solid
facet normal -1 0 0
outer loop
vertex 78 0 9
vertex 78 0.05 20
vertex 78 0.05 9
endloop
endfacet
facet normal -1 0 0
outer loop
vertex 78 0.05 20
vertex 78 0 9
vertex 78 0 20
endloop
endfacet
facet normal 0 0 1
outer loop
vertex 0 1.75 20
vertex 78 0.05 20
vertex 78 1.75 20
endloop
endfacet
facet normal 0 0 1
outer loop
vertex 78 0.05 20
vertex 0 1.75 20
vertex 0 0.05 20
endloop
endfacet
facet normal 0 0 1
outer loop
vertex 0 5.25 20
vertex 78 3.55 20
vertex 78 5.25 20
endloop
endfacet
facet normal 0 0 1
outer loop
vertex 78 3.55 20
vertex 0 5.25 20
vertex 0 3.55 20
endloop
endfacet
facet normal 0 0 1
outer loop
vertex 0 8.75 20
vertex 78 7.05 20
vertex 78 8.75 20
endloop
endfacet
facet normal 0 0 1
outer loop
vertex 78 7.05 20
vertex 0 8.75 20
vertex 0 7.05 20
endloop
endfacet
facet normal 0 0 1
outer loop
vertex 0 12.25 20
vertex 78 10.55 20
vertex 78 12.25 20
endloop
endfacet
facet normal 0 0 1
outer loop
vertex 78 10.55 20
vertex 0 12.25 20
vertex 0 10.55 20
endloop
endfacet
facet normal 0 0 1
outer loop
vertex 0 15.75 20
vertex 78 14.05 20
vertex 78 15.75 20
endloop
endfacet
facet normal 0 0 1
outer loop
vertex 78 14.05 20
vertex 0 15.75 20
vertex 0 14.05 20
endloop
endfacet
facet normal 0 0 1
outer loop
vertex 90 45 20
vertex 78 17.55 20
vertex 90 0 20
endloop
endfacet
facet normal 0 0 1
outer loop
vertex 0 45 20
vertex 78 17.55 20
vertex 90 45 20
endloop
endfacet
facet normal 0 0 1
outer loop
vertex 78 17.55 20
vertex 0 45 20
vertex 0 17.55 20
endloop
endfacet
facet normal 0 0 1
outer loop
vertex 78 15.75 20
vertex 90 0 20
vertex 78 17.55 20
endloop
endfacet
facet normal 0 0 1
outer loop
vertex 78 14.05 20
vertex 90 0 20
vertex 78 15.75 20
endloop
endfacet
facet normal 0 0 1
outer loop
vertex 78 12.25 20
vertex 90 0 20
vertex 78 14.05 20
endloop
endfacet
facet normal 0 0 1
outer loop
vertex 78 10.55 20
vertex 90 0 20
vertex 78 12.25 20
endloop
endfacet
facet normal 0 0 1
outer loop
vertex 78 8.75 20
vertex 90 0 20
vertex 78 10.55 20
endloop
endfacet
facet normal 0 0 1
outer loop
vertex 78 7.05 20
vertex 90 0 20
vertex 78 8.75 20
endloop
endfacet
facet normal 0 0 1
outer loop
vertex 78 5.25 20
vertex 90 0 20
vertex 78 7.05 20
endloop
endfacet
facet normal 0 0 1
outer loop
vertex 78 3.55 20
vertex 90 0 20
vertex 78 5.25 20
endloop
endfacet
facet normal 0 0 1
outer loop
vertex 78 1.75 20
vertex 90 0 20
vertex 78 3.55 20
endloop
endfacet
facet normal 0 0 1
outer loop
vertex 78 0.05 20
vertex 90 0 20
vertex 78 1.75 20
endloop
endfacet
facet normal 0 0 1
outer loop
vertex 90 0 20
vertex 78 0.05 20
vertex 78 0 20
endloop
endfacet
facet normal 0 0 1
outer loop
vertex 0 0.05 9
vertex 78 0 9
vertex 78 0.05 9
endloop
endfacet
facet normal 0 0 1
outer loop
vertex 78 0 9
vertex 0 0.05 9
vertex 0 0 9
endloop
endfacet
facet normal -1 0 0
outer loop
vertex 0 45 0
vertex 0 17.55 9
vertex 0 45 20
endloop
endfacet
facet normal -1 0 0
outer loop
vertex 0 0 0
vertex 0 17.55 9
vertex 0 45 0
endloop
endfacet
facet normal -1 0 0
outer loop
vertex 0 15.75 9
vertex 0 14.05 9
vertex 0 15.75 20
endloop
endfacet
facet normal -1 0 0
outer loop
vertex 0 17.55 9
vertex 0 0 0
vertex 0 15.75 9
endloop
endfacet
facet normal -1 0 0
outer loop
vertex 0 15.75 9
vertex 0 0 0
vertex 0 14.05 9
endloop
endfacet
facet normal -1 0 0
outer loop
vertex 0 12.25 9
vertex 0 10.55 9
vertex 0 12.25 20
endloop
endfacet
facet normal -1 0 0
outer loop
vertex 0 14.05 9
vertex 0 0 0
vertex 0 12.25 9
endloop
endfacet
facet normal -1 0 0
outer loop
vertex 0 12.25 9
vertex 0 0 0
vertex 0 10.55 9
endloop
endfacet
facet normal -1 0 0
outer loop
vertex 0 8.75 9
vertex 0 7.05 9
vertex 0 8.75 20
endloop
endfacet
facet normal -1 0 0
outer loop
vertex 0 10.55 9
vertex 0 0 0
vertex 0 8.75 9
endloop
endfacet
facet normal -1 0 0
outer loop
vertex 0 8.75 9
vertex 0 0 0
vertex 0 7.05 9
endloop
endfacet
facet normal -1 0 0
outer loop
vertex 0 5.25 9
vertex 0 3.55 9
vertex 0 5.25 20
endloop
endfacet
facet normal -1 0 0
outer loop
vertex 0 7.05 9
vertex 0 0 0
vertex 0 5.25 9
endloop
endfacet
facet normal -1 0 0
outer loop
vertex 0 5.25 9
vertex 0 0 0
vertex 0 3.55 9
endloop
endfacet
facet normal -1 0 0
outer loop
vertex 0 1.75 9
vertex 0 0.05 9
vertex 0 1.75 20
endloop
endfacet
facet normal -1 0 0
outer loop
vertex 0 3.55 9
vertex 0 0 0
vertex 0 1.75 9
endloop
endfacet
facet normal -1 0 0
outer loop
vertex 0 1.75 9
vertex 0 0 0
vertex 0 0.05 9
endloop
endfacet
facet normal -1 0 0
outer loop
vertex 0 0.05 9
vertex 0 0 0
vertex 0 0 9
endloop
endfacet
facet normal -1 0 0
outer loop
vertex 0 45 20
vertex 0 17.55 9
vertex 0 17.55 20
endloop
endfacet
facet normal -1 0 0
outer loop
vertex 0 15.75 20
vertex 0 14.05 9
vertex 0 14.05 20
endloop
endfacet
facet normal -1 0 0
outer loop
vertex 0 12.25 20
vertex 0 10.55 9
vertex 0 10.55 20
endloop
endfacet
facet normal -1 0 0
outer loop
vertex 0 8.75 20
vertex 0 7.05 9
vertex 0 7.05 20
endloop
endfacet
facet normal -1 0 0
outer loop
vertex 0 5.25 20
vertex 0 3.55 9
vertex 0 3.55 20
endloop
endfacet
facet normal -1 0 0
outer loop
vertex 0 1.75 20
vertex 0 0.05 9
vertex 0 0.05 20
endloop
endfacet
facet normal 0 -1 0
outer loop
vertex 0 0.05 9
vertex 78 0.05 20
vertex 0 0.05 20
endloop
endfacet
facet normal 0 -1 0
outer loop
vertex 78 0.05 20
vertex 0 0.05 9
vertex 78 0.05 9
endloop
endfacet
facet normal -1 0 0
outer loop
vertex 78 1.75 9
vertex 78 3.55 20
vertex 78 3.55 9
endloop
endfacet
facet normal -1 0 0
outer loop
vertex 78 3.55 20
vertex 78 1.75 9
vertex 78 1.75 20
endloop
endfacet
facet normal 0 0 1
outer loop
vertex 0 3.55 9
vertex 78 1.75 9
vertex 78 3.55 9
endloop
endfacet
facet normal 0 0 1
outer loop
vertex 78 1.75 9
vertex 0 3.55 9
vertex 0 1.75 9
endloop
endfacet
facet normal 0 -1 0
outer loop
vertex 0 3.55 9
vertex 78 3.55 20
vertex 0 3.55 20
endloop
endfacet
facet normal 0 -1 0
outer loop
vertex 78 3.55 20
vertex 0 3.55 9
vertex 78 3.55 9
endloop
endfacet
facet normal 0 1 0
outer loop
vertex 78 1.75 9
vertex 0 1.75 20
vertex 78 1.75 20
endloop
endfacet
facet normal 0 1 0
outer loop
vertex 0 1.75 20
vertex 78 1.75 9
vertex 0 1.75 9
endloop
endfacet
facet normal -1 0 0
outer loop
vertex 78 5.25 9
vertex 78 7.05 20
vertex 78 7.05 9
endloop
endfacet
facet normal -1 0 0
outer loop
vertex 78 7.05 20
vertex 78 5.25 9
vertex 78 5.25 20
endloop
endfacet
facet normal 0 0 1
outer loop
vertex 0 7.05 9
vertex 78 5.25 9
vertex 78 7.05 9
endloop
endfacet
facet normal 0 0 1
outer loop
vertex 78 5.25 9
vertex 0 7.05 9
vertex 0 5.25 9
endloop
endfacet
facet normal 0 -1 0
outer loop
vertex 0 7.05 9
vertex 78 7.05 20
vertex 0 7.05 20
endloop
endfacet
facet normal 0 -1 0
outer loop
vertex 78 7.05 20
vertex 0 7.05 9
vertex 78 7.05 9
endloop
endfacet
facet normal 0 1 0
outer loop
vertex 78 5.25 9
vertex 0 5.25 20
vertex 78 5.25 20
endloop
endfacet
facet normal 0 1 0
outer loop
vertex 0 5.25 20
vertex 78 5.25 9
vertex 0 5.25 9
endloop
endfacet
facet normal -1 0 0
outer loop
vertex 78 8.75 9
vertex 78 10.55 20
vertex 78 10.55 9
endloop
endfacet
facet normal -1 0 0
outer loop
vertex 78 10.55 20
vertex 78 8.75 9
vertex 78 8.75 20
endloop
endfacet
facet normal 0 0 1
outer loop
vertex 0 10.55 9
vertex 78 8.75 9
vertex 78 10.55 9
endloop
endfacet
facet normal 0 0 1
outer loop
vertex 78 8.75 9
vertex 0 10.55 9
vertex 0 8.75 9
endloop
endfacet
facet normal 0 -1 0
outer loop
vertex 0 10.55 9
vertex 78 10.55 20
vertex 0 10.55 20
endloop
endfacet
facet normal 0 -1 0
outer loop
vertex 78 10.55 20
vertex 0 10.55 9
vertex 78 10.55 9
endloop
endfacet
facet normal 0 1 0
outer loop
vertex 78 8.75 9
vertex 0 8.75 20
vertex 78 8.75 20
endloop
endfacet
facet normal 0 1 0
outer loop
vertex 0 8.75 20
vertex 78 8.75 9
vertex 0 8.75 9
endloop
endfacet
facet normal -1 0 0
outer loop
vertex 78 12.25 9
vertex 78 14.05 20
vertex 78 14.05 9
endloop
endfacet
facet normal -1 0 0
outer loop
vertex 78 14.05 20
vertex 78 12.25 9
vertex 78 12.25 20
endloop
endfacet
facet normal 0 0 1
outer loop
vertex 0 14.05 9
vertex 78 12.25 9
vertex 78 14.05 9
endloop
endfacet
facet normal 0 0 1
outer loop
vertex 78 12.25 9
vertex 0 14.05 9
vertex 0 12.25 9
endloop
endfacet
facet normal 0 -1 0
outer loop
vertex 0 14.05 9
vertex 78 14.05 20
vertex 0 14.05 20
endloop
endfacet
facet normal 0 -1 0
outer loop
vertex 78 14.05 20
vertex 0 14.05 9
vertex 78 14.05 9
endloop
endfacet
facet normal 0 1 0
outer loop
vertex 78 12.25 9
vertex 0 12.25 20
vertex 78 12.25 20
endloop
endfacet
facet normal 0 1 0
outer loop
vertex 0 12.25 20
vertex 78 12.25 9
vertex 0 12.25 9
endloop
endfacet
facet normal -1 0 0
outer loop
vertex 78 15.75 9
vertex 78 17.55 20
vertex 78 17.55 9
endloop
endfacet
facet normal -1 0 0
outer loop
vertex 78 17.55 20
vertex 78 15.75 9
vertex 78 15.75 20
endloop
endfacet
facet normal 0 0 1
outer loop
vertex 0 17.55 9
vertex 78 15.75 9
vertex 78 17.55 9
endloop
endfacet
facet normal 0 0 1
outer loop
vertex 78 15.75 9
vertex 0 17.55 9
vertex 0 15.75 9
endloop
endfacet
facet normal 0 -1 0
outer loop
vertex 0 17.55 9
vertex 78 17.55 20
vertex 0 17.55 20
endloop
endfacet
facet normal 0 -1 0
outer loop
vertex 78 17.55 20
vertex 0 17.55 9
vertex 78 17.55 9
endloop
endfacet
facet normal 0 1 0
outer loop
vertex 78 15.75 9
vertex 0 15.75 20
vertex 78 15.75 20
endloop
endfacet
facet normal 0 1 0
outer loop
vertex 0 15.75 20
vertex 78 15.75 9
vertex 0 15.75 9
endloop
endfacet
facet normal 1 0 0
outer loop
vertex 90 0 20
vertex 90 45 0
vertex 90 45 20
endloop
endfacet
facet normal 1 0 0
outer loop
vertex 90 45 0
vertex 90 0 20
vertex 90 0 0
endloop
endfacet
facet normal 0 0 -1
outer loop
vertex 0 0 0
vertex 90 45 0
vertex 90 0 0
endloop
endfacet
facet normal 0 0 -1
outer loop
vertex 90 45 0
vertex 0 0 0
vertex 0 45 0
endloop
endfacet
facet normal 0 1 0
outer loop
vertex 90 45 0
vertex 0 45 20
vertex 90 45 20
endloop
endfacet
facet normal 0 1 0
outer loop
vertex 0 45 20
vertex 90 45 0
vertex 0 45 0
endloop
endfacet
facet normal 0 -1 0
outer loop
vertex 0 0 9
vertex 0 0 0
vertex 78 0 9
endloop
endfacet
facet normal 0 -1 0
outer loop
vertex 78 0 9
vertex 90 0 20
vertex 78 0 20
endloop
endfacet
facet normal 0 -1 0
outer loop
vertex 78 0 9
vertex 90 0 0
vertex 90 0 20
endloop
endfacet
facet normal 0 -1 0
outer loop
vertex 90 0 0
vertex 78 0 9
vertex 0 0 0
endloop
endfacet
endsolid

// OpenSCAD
// Drying Rack for Microscope Slides

// Base Block Dimensions
base_length = 90;    // Length along X (mm)
base_width = 45;     // Width along Y (mm)
base_height = 20;    // Height along Z (mm)

// Slide Slot Dimensions
slot_length = 77;    // Length of the slot along X (mm)
slot_width = 1.6;    // Width of the slot along Y (mm)
slot_depth = 10;     // Depth of the slot into Z (mm)

// Slot Arrangement Parameters
num_slots = 10;      // Number of slots
slot_spacing = 3.5;  // Center-to-center spacing between slots in Y

$fn = 64; // High resolution for curves

// --- Base Block ---
module base() {
    cube([base_length, base_width, base_height]);
}

// --- Slot Cutting Tool (Extruded shape) ---
// The slot is cut into the top face (Z=20). It needs to extend slightly past the faces.
module slot_cutter(x_offset, y_offset) {
    // The cutter must be long enough in X and deep enough in Z.
    // We make it slightly longer than the required 77mm cut length for safety/coplanarity rule.
    cut_length = slot_length + 1; // Extend past X faces
    cut_width = slot_width + 0.2; // Extend slightly past Y faces (though slots are defined by their width)
    cut_depth = slot_depth + 1;  // Extend past Z face it cuts into

    translate([x_offset, y_offset, base_height - cut_depth]) {
        cube([cut_length, cut_width, cut_depth]);
    }
}


// --- Assembly ---
difference() {
    // 1. The main solid block
    base();

    // 2. Subtract the slots
    for (i = [0 : num_slots - 1]) {
        // Calculate Y position for the center of the i-th slot group
        // The slots are centered on the block in Y.
        // Total width occupied by centers: (num_slots - 1) * slot_spacing
        // Center offset from origin (Y=0): -(Total spacing / 2) + (Spacing / 2)
        y_center = (i - (num_slots - 1) / 2.0) * slot_spacing;

        // The slots are centered on the block in X, so x_offset is 0.
        x_center = 0;

        slot_cutter(x_center, y_center);
    }
}
